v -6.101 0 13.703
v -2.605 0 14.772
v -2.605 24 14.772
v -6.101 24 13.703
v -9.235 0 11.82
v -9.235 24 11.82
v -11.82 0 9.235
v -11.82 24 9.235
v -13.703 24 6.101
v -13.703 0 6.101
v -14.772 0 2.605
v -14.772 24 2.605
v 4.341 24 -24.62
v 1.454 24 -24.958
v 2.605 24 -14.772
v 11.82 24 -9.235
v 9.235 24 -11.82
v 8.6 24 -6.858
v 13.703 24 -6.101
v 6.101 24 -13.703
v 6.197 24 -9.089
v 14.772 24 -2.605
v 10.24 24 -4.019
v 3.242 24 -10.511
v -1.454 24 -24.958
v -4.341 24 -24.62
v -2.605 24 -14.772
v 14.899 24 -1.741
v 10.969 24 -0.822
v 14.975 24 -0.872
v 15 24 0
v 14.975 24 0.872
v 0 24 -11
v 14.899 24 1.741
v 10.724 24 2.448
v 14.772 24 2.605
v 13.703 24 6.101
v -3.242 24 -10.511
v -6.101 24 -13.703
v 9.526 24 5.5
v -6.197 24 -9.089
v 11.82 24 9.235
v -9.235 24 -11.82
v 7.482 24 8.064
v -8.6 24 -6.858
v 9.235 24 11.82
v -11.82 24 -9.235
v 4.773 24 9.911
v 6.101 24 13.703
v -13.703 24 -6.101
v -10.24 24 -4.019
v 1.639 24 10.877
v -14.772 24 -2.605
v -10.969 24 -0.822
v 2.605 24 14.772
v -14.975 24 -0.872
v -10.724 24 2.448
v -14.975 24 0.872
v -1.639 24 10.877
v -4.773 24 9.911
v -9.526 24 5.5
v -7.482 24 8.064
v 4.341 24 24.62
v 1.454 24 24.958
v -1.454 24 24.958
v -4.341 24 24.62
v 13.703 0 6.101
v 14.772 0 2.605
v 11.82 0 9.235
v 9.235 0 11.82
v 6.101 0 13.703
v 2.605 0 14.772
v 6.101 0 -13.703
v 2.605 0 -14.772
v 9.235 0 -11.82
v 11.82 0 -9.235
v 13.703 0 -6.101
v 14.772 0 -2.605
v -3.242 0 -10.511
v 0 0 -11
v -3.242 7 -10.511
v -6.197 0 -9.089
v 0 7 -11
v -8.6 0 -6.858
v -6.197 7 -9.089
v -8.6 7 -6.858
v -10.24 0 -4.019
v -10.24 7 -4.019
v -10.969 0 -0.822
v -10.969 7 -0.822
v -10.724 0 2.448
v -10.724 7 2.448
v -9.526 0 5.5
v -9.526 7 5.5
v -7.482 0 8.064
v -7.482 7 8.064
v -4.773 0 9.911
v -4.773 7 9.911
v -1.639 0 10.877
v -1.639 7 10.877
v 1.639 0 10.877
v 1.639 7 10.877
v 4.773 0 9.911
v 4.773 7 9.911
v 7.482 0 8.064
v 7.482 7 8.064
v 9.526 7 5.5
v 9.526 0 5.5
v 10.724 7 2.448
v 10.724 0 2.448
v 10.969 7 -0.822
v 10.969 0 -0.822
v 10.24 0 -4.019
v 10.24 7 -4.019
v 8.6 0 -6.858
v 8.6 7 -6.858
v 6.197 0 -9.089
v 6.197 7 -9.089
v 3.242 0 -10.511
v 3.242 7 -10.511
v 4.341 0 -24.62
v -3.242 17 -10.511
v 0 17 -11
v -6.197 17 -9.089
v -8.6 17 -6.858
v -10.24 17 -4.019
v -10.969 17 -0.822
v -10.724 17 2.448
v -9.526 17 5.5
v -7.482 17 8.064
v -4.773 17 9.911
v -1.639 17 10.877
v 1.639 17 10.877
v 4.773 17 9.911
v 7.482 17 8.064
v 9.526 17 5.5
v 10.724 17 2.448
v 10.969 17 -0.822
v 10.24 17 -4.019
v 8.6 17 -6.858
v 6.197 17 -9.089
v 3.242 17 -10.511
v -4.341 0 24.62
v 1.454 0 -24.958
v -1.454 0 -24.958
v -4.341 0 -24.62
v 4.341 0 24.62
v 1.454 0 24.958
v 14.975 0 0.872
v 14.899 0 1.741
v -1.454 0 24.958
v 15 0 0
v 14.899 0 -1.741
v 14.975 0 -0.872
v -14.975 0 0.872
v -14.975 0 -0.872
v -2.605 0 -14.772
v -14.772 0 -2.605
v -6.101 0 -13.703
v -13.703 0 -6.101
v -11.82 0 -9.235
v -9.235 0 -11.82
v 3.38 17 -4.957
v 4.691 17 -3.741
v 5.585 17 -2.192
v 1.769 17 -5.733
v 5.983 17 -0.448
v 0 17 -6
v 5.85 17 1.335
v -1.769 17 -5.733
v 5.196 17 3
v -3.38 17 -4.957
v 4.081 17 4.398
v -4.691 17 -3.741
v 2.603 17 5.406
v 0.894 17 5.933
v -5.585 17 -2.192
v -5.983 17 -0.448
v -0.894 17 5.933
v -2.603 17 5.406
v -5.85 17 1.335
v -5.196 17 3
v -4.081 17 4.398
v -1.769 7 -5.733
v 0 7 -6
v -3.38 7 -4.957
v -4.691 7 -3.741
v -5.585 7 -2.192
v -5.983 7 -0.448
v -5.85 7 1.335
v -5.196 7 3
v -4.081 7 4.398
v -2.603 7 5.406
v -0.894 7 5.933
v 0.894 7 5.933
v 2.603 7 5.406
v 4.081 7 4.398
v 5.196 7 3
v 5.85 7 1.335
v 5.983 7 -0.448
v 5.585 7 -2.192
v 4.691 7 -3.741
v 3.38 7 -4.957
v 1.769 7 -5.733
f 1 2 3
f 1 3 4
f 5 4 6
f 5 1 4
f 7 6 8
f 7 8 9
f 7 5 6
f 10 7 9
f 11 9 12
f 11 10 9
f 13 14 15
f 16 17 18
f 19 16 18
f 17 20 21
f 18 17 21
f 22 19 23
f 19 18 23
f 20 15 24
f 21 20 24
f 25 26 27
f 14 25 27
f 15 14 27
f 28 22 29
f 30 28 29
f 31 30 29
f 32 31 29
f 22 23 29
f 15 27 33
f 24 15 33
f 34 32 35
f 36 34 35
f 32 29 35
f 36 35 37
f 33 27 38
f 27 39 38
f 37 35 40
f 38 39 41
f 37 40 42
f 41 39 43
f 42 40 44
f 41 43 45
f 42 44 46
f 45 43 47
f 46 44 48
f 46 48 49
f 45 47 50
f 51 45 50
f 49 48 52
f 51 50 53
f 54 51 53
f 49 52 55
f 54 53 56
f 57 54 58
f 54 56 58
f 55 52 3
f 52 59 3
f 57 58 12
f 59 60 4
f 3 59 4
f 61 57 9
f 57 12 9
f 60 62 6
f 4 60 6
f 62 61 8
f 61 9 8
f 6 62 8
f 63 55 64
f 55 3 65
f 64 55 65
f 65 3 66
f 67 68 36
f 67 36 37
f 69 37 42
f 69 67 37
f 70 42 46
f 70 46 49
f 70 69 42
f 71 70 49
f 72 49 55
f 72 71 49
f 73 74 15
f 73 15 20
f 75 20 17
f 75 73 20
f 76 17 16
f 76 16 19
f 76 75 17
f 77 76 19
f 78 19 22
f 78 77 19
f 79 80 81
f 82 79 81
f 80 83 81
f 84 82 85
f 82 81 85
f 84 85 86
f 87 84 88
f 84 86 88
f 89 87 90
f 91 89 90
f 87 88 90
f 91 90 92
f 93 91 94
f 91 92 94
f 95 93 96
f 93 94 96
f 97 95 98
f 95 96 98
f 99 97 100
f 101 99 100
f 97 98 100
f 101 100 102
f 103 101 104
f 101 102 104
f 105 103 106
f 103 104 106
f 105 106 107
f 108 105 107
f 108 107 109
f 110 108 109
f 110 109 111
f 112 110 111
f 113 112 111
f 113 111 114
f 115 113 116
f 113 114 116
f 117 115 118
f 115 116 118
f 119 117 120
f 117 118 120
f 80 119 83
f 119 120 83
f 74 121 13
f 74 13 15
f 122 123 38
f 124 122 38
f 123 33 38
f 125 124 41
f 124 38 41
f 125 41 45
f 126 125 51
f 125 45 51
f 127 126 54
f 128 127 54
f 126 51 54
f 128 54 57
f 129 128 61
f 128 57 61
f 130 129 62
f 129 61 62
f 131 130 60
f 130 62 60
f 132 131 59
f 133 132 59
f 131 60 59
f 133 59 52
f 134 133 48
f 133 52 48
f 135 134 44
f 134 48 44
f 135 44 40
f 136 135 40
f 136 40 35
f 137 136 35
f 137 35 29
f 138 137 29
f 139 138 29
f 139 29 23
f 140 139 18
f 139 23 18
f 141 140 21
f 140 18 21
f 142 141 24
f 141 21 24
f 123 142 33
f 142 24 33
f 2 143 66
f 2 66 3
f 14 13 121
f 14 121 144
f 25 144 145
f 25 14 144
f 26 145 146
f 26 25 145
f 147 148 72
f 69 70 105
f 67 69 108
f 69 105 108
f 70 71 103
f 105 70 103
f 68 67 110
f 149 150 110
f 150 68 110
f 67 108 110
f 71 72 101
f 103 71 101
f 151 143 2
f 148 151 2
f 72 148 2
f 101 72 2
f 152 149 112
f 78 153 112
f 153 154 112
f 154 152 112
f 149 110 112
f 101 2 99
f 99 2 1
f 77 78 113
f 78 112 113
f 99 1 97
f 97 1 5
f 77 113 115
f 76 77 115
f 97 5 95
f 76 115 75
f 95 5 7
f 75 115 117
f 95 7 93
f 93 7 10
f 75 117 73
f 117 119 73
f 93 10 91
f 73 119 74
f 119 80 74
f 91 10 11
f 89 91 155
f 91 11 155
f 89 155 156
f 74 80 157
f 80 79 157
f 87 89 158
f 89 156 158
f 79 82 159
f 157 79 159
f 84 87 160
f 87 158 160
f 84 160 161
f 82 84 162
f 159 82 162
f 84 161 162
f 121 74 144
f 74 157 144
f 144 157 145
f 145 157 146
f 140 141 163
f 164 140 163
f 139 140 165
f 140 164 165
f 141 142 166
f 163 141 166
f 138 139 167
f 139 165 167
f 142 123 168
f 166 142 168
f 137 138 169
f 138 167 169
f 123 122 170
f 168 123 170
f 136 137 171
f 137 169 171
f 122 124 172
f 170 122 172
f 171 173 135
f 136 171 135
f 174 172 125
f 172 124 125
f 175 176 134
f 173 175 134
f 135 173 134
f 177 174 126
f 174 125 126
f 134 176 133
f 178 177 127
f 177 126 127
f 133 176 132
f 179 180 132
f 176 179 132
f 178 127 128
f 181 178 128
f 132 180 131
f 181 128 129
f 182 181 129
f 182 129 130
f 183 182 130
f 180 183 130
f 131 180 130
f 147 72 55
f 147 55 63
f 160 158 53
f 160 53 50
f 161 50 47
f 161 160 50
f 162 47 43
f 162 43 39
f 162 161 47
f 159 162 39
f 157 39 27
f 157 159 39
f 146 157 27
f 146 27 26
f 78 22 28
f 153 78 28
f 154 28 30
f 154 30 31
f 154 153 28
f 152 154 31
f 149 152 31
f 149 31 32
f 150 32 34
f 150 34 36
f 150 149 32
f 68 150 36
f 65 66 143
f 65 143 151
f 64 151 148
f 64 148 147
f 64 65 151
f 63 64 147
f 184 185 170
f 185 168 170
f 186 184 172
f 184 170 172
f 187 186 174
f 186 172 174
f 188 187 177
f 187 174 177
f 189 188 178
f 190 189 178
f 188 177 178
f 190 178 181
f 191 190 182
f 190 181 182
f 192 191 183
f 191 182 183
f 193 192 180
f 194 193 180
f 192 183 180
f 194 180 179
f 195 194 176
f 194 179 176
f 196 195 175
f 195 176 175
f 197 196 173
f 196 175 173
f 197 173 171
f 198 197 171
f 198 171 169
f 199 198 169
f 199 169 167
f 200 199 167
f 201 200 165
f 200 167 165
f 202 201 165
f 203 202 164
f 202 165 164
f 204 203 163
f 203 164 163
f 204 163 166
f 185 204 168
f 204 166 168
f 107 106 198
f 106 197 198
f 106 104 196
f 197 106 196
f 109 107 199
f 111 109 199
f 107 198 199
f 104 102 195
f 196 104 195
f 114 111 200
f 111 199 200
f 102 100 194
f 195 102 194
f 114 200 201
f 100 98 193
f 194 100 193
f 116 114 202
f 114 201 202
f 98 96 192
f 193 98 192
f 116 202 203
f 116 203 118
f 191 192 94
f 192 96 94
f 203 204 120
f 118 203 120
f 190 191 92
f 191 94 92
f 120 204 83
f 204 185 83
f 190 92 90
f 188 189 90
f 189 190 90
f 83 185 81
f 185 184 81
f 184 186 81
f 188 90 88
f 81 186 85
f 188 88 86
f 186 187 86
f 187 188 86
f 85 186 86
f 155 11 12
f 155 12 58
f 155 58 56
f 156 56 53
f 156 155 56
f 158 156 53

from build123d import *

# Parameters (mm, degrees)
CUT_EXTRUDE2_START = -100
CUT_EXTRUDE2_DEPTH = 100


with BuildPart() as part:
    # Sketch1 → Revolve1 (revolve)
    with BuildSketch(Plane.XY, mode=Mode.PRIVATE) as revolve1_sk:
        Polygon((25, 24), (25, 4.595744681), (25, 0), (11, 0), (11, 7), (6, 7), (6, 17), (11, 17), (11, 24), align=None)
    revolve(revolve1_sk.sketch.rotate(Axis((0, 0, 0), (0, 1, 0)), 90), axis=Axis((0, 0, 0), (0, 1, 0)))

    # Sketch2 → Cut-Extrude2 (cut)
    with BuildSketch(Plane(origin=(0, 24, 0), x_dir=(1, 0, 0), z_dir=(0, 1, 0)).offset(CUT_EXTRUDE2_START)):
        with BuildLine():
            Line((4.341204442, 24.620193825), (2.604722665, 14.772116295))
            ThreePointArc((2.604722665, 14.772116295), (10.606601718, 10.606601718), (14.772116295, 2.604722665))
            Line((14.772116295, 2.604722665), (24.620193825, 4.341204442))
            ThreePointArc((24.620193825, 4.341204442), (17.67766953, 17.67766953), (4.341204442, 24.620193825))
        make_face()
        with BuildLine():
            ThreePointArc((15, 0), (14.942920471, -1.307336141), (14.772116295, -2.604722665))
            Line((14.772116295, -2.604722665), (24.620193825, -4.341204442))
            ThreePointArc((24.620193825, -4.341204442), (24.904867452, -2.178893569), (25, 0))
            ThreePointArc((25, 0), (24.904867452, 2.178893569), (24.620193825, 4.341204442))
            Line((24.620193825, 4.341204442), (14.772116295, 2.604722665))
            ThreePointArc((14.772116295, 2.604722665), (14.942920471, 1.307336141), (15, 0))
        make_face()
        with BuildLine():
            Line((24.620193825, -4.341204442), (14.772116295, -2.604722665))
            ThreePointArc((14.772116295, -2.604722665), (10.606601718, -10.606601718), (2.604722665, -14.772116295))
            Line((2.604722665, -14.772116295), (4.341204442, -24.620193825))
            ThreePointArc((4.341204442, -24.620193825), (17.67766953, -17.67766953), (24.620193825, -4.341204442))
        make_face()
        with BuildLine():
            Line((-4.341204442, -24.620193825), (-2.604722665, -14.772116295))
            ThreePointArc((-2.604722665, -14.772116295), (-10.606601718, -10.606601718), (-14.772116295, -2.604722665))
            Line((-14.772116295, -2.604722665), (-24.620193825, -4.341204442))
            ThreePointArc((-24.620193825, -4.341204442), (-17.67766953, -17.67766953), (-4.341204442, -24.620193825))
        make_face()
        with BuildLine():
            ThreePointArc((-14.772116295, -2.604722665), (-15, 0), (-14.772116295, 2.604722665))
            Line((-14.772116295, 2.604722665), (-24.620193825, 4.341204442))
            ThreePointArc((-24.620193825, 4.341204442), (-25, 0), (-24.620193825, -4.341204442))
            Line((-24.620193825, -4.341204442), (-14.772116295, -2.604722665))
        make_face()
        with BuildLine():
            ThreePointArc((-14.772116295, 2.604722665), (-10.606601718, 10.606601718), (-2.604722665, 14.772116295))
            Line((-2.604722665, 14.772116295), (-4.341204442, 24.620193825))
            ThreePointArc((-4.341204442, 24.620193825), (-17.67766953, 17.67766953), (-24.620193825, 4.341204442))
            Line((-24.620193825, 4.341204442), (-14.772116295, 2.604722665))
        make_face()
    extrude(amount=CUT_EXTRUDE2_DEPTH, mode=Mode.SUBTRACT)


solid = part.part
